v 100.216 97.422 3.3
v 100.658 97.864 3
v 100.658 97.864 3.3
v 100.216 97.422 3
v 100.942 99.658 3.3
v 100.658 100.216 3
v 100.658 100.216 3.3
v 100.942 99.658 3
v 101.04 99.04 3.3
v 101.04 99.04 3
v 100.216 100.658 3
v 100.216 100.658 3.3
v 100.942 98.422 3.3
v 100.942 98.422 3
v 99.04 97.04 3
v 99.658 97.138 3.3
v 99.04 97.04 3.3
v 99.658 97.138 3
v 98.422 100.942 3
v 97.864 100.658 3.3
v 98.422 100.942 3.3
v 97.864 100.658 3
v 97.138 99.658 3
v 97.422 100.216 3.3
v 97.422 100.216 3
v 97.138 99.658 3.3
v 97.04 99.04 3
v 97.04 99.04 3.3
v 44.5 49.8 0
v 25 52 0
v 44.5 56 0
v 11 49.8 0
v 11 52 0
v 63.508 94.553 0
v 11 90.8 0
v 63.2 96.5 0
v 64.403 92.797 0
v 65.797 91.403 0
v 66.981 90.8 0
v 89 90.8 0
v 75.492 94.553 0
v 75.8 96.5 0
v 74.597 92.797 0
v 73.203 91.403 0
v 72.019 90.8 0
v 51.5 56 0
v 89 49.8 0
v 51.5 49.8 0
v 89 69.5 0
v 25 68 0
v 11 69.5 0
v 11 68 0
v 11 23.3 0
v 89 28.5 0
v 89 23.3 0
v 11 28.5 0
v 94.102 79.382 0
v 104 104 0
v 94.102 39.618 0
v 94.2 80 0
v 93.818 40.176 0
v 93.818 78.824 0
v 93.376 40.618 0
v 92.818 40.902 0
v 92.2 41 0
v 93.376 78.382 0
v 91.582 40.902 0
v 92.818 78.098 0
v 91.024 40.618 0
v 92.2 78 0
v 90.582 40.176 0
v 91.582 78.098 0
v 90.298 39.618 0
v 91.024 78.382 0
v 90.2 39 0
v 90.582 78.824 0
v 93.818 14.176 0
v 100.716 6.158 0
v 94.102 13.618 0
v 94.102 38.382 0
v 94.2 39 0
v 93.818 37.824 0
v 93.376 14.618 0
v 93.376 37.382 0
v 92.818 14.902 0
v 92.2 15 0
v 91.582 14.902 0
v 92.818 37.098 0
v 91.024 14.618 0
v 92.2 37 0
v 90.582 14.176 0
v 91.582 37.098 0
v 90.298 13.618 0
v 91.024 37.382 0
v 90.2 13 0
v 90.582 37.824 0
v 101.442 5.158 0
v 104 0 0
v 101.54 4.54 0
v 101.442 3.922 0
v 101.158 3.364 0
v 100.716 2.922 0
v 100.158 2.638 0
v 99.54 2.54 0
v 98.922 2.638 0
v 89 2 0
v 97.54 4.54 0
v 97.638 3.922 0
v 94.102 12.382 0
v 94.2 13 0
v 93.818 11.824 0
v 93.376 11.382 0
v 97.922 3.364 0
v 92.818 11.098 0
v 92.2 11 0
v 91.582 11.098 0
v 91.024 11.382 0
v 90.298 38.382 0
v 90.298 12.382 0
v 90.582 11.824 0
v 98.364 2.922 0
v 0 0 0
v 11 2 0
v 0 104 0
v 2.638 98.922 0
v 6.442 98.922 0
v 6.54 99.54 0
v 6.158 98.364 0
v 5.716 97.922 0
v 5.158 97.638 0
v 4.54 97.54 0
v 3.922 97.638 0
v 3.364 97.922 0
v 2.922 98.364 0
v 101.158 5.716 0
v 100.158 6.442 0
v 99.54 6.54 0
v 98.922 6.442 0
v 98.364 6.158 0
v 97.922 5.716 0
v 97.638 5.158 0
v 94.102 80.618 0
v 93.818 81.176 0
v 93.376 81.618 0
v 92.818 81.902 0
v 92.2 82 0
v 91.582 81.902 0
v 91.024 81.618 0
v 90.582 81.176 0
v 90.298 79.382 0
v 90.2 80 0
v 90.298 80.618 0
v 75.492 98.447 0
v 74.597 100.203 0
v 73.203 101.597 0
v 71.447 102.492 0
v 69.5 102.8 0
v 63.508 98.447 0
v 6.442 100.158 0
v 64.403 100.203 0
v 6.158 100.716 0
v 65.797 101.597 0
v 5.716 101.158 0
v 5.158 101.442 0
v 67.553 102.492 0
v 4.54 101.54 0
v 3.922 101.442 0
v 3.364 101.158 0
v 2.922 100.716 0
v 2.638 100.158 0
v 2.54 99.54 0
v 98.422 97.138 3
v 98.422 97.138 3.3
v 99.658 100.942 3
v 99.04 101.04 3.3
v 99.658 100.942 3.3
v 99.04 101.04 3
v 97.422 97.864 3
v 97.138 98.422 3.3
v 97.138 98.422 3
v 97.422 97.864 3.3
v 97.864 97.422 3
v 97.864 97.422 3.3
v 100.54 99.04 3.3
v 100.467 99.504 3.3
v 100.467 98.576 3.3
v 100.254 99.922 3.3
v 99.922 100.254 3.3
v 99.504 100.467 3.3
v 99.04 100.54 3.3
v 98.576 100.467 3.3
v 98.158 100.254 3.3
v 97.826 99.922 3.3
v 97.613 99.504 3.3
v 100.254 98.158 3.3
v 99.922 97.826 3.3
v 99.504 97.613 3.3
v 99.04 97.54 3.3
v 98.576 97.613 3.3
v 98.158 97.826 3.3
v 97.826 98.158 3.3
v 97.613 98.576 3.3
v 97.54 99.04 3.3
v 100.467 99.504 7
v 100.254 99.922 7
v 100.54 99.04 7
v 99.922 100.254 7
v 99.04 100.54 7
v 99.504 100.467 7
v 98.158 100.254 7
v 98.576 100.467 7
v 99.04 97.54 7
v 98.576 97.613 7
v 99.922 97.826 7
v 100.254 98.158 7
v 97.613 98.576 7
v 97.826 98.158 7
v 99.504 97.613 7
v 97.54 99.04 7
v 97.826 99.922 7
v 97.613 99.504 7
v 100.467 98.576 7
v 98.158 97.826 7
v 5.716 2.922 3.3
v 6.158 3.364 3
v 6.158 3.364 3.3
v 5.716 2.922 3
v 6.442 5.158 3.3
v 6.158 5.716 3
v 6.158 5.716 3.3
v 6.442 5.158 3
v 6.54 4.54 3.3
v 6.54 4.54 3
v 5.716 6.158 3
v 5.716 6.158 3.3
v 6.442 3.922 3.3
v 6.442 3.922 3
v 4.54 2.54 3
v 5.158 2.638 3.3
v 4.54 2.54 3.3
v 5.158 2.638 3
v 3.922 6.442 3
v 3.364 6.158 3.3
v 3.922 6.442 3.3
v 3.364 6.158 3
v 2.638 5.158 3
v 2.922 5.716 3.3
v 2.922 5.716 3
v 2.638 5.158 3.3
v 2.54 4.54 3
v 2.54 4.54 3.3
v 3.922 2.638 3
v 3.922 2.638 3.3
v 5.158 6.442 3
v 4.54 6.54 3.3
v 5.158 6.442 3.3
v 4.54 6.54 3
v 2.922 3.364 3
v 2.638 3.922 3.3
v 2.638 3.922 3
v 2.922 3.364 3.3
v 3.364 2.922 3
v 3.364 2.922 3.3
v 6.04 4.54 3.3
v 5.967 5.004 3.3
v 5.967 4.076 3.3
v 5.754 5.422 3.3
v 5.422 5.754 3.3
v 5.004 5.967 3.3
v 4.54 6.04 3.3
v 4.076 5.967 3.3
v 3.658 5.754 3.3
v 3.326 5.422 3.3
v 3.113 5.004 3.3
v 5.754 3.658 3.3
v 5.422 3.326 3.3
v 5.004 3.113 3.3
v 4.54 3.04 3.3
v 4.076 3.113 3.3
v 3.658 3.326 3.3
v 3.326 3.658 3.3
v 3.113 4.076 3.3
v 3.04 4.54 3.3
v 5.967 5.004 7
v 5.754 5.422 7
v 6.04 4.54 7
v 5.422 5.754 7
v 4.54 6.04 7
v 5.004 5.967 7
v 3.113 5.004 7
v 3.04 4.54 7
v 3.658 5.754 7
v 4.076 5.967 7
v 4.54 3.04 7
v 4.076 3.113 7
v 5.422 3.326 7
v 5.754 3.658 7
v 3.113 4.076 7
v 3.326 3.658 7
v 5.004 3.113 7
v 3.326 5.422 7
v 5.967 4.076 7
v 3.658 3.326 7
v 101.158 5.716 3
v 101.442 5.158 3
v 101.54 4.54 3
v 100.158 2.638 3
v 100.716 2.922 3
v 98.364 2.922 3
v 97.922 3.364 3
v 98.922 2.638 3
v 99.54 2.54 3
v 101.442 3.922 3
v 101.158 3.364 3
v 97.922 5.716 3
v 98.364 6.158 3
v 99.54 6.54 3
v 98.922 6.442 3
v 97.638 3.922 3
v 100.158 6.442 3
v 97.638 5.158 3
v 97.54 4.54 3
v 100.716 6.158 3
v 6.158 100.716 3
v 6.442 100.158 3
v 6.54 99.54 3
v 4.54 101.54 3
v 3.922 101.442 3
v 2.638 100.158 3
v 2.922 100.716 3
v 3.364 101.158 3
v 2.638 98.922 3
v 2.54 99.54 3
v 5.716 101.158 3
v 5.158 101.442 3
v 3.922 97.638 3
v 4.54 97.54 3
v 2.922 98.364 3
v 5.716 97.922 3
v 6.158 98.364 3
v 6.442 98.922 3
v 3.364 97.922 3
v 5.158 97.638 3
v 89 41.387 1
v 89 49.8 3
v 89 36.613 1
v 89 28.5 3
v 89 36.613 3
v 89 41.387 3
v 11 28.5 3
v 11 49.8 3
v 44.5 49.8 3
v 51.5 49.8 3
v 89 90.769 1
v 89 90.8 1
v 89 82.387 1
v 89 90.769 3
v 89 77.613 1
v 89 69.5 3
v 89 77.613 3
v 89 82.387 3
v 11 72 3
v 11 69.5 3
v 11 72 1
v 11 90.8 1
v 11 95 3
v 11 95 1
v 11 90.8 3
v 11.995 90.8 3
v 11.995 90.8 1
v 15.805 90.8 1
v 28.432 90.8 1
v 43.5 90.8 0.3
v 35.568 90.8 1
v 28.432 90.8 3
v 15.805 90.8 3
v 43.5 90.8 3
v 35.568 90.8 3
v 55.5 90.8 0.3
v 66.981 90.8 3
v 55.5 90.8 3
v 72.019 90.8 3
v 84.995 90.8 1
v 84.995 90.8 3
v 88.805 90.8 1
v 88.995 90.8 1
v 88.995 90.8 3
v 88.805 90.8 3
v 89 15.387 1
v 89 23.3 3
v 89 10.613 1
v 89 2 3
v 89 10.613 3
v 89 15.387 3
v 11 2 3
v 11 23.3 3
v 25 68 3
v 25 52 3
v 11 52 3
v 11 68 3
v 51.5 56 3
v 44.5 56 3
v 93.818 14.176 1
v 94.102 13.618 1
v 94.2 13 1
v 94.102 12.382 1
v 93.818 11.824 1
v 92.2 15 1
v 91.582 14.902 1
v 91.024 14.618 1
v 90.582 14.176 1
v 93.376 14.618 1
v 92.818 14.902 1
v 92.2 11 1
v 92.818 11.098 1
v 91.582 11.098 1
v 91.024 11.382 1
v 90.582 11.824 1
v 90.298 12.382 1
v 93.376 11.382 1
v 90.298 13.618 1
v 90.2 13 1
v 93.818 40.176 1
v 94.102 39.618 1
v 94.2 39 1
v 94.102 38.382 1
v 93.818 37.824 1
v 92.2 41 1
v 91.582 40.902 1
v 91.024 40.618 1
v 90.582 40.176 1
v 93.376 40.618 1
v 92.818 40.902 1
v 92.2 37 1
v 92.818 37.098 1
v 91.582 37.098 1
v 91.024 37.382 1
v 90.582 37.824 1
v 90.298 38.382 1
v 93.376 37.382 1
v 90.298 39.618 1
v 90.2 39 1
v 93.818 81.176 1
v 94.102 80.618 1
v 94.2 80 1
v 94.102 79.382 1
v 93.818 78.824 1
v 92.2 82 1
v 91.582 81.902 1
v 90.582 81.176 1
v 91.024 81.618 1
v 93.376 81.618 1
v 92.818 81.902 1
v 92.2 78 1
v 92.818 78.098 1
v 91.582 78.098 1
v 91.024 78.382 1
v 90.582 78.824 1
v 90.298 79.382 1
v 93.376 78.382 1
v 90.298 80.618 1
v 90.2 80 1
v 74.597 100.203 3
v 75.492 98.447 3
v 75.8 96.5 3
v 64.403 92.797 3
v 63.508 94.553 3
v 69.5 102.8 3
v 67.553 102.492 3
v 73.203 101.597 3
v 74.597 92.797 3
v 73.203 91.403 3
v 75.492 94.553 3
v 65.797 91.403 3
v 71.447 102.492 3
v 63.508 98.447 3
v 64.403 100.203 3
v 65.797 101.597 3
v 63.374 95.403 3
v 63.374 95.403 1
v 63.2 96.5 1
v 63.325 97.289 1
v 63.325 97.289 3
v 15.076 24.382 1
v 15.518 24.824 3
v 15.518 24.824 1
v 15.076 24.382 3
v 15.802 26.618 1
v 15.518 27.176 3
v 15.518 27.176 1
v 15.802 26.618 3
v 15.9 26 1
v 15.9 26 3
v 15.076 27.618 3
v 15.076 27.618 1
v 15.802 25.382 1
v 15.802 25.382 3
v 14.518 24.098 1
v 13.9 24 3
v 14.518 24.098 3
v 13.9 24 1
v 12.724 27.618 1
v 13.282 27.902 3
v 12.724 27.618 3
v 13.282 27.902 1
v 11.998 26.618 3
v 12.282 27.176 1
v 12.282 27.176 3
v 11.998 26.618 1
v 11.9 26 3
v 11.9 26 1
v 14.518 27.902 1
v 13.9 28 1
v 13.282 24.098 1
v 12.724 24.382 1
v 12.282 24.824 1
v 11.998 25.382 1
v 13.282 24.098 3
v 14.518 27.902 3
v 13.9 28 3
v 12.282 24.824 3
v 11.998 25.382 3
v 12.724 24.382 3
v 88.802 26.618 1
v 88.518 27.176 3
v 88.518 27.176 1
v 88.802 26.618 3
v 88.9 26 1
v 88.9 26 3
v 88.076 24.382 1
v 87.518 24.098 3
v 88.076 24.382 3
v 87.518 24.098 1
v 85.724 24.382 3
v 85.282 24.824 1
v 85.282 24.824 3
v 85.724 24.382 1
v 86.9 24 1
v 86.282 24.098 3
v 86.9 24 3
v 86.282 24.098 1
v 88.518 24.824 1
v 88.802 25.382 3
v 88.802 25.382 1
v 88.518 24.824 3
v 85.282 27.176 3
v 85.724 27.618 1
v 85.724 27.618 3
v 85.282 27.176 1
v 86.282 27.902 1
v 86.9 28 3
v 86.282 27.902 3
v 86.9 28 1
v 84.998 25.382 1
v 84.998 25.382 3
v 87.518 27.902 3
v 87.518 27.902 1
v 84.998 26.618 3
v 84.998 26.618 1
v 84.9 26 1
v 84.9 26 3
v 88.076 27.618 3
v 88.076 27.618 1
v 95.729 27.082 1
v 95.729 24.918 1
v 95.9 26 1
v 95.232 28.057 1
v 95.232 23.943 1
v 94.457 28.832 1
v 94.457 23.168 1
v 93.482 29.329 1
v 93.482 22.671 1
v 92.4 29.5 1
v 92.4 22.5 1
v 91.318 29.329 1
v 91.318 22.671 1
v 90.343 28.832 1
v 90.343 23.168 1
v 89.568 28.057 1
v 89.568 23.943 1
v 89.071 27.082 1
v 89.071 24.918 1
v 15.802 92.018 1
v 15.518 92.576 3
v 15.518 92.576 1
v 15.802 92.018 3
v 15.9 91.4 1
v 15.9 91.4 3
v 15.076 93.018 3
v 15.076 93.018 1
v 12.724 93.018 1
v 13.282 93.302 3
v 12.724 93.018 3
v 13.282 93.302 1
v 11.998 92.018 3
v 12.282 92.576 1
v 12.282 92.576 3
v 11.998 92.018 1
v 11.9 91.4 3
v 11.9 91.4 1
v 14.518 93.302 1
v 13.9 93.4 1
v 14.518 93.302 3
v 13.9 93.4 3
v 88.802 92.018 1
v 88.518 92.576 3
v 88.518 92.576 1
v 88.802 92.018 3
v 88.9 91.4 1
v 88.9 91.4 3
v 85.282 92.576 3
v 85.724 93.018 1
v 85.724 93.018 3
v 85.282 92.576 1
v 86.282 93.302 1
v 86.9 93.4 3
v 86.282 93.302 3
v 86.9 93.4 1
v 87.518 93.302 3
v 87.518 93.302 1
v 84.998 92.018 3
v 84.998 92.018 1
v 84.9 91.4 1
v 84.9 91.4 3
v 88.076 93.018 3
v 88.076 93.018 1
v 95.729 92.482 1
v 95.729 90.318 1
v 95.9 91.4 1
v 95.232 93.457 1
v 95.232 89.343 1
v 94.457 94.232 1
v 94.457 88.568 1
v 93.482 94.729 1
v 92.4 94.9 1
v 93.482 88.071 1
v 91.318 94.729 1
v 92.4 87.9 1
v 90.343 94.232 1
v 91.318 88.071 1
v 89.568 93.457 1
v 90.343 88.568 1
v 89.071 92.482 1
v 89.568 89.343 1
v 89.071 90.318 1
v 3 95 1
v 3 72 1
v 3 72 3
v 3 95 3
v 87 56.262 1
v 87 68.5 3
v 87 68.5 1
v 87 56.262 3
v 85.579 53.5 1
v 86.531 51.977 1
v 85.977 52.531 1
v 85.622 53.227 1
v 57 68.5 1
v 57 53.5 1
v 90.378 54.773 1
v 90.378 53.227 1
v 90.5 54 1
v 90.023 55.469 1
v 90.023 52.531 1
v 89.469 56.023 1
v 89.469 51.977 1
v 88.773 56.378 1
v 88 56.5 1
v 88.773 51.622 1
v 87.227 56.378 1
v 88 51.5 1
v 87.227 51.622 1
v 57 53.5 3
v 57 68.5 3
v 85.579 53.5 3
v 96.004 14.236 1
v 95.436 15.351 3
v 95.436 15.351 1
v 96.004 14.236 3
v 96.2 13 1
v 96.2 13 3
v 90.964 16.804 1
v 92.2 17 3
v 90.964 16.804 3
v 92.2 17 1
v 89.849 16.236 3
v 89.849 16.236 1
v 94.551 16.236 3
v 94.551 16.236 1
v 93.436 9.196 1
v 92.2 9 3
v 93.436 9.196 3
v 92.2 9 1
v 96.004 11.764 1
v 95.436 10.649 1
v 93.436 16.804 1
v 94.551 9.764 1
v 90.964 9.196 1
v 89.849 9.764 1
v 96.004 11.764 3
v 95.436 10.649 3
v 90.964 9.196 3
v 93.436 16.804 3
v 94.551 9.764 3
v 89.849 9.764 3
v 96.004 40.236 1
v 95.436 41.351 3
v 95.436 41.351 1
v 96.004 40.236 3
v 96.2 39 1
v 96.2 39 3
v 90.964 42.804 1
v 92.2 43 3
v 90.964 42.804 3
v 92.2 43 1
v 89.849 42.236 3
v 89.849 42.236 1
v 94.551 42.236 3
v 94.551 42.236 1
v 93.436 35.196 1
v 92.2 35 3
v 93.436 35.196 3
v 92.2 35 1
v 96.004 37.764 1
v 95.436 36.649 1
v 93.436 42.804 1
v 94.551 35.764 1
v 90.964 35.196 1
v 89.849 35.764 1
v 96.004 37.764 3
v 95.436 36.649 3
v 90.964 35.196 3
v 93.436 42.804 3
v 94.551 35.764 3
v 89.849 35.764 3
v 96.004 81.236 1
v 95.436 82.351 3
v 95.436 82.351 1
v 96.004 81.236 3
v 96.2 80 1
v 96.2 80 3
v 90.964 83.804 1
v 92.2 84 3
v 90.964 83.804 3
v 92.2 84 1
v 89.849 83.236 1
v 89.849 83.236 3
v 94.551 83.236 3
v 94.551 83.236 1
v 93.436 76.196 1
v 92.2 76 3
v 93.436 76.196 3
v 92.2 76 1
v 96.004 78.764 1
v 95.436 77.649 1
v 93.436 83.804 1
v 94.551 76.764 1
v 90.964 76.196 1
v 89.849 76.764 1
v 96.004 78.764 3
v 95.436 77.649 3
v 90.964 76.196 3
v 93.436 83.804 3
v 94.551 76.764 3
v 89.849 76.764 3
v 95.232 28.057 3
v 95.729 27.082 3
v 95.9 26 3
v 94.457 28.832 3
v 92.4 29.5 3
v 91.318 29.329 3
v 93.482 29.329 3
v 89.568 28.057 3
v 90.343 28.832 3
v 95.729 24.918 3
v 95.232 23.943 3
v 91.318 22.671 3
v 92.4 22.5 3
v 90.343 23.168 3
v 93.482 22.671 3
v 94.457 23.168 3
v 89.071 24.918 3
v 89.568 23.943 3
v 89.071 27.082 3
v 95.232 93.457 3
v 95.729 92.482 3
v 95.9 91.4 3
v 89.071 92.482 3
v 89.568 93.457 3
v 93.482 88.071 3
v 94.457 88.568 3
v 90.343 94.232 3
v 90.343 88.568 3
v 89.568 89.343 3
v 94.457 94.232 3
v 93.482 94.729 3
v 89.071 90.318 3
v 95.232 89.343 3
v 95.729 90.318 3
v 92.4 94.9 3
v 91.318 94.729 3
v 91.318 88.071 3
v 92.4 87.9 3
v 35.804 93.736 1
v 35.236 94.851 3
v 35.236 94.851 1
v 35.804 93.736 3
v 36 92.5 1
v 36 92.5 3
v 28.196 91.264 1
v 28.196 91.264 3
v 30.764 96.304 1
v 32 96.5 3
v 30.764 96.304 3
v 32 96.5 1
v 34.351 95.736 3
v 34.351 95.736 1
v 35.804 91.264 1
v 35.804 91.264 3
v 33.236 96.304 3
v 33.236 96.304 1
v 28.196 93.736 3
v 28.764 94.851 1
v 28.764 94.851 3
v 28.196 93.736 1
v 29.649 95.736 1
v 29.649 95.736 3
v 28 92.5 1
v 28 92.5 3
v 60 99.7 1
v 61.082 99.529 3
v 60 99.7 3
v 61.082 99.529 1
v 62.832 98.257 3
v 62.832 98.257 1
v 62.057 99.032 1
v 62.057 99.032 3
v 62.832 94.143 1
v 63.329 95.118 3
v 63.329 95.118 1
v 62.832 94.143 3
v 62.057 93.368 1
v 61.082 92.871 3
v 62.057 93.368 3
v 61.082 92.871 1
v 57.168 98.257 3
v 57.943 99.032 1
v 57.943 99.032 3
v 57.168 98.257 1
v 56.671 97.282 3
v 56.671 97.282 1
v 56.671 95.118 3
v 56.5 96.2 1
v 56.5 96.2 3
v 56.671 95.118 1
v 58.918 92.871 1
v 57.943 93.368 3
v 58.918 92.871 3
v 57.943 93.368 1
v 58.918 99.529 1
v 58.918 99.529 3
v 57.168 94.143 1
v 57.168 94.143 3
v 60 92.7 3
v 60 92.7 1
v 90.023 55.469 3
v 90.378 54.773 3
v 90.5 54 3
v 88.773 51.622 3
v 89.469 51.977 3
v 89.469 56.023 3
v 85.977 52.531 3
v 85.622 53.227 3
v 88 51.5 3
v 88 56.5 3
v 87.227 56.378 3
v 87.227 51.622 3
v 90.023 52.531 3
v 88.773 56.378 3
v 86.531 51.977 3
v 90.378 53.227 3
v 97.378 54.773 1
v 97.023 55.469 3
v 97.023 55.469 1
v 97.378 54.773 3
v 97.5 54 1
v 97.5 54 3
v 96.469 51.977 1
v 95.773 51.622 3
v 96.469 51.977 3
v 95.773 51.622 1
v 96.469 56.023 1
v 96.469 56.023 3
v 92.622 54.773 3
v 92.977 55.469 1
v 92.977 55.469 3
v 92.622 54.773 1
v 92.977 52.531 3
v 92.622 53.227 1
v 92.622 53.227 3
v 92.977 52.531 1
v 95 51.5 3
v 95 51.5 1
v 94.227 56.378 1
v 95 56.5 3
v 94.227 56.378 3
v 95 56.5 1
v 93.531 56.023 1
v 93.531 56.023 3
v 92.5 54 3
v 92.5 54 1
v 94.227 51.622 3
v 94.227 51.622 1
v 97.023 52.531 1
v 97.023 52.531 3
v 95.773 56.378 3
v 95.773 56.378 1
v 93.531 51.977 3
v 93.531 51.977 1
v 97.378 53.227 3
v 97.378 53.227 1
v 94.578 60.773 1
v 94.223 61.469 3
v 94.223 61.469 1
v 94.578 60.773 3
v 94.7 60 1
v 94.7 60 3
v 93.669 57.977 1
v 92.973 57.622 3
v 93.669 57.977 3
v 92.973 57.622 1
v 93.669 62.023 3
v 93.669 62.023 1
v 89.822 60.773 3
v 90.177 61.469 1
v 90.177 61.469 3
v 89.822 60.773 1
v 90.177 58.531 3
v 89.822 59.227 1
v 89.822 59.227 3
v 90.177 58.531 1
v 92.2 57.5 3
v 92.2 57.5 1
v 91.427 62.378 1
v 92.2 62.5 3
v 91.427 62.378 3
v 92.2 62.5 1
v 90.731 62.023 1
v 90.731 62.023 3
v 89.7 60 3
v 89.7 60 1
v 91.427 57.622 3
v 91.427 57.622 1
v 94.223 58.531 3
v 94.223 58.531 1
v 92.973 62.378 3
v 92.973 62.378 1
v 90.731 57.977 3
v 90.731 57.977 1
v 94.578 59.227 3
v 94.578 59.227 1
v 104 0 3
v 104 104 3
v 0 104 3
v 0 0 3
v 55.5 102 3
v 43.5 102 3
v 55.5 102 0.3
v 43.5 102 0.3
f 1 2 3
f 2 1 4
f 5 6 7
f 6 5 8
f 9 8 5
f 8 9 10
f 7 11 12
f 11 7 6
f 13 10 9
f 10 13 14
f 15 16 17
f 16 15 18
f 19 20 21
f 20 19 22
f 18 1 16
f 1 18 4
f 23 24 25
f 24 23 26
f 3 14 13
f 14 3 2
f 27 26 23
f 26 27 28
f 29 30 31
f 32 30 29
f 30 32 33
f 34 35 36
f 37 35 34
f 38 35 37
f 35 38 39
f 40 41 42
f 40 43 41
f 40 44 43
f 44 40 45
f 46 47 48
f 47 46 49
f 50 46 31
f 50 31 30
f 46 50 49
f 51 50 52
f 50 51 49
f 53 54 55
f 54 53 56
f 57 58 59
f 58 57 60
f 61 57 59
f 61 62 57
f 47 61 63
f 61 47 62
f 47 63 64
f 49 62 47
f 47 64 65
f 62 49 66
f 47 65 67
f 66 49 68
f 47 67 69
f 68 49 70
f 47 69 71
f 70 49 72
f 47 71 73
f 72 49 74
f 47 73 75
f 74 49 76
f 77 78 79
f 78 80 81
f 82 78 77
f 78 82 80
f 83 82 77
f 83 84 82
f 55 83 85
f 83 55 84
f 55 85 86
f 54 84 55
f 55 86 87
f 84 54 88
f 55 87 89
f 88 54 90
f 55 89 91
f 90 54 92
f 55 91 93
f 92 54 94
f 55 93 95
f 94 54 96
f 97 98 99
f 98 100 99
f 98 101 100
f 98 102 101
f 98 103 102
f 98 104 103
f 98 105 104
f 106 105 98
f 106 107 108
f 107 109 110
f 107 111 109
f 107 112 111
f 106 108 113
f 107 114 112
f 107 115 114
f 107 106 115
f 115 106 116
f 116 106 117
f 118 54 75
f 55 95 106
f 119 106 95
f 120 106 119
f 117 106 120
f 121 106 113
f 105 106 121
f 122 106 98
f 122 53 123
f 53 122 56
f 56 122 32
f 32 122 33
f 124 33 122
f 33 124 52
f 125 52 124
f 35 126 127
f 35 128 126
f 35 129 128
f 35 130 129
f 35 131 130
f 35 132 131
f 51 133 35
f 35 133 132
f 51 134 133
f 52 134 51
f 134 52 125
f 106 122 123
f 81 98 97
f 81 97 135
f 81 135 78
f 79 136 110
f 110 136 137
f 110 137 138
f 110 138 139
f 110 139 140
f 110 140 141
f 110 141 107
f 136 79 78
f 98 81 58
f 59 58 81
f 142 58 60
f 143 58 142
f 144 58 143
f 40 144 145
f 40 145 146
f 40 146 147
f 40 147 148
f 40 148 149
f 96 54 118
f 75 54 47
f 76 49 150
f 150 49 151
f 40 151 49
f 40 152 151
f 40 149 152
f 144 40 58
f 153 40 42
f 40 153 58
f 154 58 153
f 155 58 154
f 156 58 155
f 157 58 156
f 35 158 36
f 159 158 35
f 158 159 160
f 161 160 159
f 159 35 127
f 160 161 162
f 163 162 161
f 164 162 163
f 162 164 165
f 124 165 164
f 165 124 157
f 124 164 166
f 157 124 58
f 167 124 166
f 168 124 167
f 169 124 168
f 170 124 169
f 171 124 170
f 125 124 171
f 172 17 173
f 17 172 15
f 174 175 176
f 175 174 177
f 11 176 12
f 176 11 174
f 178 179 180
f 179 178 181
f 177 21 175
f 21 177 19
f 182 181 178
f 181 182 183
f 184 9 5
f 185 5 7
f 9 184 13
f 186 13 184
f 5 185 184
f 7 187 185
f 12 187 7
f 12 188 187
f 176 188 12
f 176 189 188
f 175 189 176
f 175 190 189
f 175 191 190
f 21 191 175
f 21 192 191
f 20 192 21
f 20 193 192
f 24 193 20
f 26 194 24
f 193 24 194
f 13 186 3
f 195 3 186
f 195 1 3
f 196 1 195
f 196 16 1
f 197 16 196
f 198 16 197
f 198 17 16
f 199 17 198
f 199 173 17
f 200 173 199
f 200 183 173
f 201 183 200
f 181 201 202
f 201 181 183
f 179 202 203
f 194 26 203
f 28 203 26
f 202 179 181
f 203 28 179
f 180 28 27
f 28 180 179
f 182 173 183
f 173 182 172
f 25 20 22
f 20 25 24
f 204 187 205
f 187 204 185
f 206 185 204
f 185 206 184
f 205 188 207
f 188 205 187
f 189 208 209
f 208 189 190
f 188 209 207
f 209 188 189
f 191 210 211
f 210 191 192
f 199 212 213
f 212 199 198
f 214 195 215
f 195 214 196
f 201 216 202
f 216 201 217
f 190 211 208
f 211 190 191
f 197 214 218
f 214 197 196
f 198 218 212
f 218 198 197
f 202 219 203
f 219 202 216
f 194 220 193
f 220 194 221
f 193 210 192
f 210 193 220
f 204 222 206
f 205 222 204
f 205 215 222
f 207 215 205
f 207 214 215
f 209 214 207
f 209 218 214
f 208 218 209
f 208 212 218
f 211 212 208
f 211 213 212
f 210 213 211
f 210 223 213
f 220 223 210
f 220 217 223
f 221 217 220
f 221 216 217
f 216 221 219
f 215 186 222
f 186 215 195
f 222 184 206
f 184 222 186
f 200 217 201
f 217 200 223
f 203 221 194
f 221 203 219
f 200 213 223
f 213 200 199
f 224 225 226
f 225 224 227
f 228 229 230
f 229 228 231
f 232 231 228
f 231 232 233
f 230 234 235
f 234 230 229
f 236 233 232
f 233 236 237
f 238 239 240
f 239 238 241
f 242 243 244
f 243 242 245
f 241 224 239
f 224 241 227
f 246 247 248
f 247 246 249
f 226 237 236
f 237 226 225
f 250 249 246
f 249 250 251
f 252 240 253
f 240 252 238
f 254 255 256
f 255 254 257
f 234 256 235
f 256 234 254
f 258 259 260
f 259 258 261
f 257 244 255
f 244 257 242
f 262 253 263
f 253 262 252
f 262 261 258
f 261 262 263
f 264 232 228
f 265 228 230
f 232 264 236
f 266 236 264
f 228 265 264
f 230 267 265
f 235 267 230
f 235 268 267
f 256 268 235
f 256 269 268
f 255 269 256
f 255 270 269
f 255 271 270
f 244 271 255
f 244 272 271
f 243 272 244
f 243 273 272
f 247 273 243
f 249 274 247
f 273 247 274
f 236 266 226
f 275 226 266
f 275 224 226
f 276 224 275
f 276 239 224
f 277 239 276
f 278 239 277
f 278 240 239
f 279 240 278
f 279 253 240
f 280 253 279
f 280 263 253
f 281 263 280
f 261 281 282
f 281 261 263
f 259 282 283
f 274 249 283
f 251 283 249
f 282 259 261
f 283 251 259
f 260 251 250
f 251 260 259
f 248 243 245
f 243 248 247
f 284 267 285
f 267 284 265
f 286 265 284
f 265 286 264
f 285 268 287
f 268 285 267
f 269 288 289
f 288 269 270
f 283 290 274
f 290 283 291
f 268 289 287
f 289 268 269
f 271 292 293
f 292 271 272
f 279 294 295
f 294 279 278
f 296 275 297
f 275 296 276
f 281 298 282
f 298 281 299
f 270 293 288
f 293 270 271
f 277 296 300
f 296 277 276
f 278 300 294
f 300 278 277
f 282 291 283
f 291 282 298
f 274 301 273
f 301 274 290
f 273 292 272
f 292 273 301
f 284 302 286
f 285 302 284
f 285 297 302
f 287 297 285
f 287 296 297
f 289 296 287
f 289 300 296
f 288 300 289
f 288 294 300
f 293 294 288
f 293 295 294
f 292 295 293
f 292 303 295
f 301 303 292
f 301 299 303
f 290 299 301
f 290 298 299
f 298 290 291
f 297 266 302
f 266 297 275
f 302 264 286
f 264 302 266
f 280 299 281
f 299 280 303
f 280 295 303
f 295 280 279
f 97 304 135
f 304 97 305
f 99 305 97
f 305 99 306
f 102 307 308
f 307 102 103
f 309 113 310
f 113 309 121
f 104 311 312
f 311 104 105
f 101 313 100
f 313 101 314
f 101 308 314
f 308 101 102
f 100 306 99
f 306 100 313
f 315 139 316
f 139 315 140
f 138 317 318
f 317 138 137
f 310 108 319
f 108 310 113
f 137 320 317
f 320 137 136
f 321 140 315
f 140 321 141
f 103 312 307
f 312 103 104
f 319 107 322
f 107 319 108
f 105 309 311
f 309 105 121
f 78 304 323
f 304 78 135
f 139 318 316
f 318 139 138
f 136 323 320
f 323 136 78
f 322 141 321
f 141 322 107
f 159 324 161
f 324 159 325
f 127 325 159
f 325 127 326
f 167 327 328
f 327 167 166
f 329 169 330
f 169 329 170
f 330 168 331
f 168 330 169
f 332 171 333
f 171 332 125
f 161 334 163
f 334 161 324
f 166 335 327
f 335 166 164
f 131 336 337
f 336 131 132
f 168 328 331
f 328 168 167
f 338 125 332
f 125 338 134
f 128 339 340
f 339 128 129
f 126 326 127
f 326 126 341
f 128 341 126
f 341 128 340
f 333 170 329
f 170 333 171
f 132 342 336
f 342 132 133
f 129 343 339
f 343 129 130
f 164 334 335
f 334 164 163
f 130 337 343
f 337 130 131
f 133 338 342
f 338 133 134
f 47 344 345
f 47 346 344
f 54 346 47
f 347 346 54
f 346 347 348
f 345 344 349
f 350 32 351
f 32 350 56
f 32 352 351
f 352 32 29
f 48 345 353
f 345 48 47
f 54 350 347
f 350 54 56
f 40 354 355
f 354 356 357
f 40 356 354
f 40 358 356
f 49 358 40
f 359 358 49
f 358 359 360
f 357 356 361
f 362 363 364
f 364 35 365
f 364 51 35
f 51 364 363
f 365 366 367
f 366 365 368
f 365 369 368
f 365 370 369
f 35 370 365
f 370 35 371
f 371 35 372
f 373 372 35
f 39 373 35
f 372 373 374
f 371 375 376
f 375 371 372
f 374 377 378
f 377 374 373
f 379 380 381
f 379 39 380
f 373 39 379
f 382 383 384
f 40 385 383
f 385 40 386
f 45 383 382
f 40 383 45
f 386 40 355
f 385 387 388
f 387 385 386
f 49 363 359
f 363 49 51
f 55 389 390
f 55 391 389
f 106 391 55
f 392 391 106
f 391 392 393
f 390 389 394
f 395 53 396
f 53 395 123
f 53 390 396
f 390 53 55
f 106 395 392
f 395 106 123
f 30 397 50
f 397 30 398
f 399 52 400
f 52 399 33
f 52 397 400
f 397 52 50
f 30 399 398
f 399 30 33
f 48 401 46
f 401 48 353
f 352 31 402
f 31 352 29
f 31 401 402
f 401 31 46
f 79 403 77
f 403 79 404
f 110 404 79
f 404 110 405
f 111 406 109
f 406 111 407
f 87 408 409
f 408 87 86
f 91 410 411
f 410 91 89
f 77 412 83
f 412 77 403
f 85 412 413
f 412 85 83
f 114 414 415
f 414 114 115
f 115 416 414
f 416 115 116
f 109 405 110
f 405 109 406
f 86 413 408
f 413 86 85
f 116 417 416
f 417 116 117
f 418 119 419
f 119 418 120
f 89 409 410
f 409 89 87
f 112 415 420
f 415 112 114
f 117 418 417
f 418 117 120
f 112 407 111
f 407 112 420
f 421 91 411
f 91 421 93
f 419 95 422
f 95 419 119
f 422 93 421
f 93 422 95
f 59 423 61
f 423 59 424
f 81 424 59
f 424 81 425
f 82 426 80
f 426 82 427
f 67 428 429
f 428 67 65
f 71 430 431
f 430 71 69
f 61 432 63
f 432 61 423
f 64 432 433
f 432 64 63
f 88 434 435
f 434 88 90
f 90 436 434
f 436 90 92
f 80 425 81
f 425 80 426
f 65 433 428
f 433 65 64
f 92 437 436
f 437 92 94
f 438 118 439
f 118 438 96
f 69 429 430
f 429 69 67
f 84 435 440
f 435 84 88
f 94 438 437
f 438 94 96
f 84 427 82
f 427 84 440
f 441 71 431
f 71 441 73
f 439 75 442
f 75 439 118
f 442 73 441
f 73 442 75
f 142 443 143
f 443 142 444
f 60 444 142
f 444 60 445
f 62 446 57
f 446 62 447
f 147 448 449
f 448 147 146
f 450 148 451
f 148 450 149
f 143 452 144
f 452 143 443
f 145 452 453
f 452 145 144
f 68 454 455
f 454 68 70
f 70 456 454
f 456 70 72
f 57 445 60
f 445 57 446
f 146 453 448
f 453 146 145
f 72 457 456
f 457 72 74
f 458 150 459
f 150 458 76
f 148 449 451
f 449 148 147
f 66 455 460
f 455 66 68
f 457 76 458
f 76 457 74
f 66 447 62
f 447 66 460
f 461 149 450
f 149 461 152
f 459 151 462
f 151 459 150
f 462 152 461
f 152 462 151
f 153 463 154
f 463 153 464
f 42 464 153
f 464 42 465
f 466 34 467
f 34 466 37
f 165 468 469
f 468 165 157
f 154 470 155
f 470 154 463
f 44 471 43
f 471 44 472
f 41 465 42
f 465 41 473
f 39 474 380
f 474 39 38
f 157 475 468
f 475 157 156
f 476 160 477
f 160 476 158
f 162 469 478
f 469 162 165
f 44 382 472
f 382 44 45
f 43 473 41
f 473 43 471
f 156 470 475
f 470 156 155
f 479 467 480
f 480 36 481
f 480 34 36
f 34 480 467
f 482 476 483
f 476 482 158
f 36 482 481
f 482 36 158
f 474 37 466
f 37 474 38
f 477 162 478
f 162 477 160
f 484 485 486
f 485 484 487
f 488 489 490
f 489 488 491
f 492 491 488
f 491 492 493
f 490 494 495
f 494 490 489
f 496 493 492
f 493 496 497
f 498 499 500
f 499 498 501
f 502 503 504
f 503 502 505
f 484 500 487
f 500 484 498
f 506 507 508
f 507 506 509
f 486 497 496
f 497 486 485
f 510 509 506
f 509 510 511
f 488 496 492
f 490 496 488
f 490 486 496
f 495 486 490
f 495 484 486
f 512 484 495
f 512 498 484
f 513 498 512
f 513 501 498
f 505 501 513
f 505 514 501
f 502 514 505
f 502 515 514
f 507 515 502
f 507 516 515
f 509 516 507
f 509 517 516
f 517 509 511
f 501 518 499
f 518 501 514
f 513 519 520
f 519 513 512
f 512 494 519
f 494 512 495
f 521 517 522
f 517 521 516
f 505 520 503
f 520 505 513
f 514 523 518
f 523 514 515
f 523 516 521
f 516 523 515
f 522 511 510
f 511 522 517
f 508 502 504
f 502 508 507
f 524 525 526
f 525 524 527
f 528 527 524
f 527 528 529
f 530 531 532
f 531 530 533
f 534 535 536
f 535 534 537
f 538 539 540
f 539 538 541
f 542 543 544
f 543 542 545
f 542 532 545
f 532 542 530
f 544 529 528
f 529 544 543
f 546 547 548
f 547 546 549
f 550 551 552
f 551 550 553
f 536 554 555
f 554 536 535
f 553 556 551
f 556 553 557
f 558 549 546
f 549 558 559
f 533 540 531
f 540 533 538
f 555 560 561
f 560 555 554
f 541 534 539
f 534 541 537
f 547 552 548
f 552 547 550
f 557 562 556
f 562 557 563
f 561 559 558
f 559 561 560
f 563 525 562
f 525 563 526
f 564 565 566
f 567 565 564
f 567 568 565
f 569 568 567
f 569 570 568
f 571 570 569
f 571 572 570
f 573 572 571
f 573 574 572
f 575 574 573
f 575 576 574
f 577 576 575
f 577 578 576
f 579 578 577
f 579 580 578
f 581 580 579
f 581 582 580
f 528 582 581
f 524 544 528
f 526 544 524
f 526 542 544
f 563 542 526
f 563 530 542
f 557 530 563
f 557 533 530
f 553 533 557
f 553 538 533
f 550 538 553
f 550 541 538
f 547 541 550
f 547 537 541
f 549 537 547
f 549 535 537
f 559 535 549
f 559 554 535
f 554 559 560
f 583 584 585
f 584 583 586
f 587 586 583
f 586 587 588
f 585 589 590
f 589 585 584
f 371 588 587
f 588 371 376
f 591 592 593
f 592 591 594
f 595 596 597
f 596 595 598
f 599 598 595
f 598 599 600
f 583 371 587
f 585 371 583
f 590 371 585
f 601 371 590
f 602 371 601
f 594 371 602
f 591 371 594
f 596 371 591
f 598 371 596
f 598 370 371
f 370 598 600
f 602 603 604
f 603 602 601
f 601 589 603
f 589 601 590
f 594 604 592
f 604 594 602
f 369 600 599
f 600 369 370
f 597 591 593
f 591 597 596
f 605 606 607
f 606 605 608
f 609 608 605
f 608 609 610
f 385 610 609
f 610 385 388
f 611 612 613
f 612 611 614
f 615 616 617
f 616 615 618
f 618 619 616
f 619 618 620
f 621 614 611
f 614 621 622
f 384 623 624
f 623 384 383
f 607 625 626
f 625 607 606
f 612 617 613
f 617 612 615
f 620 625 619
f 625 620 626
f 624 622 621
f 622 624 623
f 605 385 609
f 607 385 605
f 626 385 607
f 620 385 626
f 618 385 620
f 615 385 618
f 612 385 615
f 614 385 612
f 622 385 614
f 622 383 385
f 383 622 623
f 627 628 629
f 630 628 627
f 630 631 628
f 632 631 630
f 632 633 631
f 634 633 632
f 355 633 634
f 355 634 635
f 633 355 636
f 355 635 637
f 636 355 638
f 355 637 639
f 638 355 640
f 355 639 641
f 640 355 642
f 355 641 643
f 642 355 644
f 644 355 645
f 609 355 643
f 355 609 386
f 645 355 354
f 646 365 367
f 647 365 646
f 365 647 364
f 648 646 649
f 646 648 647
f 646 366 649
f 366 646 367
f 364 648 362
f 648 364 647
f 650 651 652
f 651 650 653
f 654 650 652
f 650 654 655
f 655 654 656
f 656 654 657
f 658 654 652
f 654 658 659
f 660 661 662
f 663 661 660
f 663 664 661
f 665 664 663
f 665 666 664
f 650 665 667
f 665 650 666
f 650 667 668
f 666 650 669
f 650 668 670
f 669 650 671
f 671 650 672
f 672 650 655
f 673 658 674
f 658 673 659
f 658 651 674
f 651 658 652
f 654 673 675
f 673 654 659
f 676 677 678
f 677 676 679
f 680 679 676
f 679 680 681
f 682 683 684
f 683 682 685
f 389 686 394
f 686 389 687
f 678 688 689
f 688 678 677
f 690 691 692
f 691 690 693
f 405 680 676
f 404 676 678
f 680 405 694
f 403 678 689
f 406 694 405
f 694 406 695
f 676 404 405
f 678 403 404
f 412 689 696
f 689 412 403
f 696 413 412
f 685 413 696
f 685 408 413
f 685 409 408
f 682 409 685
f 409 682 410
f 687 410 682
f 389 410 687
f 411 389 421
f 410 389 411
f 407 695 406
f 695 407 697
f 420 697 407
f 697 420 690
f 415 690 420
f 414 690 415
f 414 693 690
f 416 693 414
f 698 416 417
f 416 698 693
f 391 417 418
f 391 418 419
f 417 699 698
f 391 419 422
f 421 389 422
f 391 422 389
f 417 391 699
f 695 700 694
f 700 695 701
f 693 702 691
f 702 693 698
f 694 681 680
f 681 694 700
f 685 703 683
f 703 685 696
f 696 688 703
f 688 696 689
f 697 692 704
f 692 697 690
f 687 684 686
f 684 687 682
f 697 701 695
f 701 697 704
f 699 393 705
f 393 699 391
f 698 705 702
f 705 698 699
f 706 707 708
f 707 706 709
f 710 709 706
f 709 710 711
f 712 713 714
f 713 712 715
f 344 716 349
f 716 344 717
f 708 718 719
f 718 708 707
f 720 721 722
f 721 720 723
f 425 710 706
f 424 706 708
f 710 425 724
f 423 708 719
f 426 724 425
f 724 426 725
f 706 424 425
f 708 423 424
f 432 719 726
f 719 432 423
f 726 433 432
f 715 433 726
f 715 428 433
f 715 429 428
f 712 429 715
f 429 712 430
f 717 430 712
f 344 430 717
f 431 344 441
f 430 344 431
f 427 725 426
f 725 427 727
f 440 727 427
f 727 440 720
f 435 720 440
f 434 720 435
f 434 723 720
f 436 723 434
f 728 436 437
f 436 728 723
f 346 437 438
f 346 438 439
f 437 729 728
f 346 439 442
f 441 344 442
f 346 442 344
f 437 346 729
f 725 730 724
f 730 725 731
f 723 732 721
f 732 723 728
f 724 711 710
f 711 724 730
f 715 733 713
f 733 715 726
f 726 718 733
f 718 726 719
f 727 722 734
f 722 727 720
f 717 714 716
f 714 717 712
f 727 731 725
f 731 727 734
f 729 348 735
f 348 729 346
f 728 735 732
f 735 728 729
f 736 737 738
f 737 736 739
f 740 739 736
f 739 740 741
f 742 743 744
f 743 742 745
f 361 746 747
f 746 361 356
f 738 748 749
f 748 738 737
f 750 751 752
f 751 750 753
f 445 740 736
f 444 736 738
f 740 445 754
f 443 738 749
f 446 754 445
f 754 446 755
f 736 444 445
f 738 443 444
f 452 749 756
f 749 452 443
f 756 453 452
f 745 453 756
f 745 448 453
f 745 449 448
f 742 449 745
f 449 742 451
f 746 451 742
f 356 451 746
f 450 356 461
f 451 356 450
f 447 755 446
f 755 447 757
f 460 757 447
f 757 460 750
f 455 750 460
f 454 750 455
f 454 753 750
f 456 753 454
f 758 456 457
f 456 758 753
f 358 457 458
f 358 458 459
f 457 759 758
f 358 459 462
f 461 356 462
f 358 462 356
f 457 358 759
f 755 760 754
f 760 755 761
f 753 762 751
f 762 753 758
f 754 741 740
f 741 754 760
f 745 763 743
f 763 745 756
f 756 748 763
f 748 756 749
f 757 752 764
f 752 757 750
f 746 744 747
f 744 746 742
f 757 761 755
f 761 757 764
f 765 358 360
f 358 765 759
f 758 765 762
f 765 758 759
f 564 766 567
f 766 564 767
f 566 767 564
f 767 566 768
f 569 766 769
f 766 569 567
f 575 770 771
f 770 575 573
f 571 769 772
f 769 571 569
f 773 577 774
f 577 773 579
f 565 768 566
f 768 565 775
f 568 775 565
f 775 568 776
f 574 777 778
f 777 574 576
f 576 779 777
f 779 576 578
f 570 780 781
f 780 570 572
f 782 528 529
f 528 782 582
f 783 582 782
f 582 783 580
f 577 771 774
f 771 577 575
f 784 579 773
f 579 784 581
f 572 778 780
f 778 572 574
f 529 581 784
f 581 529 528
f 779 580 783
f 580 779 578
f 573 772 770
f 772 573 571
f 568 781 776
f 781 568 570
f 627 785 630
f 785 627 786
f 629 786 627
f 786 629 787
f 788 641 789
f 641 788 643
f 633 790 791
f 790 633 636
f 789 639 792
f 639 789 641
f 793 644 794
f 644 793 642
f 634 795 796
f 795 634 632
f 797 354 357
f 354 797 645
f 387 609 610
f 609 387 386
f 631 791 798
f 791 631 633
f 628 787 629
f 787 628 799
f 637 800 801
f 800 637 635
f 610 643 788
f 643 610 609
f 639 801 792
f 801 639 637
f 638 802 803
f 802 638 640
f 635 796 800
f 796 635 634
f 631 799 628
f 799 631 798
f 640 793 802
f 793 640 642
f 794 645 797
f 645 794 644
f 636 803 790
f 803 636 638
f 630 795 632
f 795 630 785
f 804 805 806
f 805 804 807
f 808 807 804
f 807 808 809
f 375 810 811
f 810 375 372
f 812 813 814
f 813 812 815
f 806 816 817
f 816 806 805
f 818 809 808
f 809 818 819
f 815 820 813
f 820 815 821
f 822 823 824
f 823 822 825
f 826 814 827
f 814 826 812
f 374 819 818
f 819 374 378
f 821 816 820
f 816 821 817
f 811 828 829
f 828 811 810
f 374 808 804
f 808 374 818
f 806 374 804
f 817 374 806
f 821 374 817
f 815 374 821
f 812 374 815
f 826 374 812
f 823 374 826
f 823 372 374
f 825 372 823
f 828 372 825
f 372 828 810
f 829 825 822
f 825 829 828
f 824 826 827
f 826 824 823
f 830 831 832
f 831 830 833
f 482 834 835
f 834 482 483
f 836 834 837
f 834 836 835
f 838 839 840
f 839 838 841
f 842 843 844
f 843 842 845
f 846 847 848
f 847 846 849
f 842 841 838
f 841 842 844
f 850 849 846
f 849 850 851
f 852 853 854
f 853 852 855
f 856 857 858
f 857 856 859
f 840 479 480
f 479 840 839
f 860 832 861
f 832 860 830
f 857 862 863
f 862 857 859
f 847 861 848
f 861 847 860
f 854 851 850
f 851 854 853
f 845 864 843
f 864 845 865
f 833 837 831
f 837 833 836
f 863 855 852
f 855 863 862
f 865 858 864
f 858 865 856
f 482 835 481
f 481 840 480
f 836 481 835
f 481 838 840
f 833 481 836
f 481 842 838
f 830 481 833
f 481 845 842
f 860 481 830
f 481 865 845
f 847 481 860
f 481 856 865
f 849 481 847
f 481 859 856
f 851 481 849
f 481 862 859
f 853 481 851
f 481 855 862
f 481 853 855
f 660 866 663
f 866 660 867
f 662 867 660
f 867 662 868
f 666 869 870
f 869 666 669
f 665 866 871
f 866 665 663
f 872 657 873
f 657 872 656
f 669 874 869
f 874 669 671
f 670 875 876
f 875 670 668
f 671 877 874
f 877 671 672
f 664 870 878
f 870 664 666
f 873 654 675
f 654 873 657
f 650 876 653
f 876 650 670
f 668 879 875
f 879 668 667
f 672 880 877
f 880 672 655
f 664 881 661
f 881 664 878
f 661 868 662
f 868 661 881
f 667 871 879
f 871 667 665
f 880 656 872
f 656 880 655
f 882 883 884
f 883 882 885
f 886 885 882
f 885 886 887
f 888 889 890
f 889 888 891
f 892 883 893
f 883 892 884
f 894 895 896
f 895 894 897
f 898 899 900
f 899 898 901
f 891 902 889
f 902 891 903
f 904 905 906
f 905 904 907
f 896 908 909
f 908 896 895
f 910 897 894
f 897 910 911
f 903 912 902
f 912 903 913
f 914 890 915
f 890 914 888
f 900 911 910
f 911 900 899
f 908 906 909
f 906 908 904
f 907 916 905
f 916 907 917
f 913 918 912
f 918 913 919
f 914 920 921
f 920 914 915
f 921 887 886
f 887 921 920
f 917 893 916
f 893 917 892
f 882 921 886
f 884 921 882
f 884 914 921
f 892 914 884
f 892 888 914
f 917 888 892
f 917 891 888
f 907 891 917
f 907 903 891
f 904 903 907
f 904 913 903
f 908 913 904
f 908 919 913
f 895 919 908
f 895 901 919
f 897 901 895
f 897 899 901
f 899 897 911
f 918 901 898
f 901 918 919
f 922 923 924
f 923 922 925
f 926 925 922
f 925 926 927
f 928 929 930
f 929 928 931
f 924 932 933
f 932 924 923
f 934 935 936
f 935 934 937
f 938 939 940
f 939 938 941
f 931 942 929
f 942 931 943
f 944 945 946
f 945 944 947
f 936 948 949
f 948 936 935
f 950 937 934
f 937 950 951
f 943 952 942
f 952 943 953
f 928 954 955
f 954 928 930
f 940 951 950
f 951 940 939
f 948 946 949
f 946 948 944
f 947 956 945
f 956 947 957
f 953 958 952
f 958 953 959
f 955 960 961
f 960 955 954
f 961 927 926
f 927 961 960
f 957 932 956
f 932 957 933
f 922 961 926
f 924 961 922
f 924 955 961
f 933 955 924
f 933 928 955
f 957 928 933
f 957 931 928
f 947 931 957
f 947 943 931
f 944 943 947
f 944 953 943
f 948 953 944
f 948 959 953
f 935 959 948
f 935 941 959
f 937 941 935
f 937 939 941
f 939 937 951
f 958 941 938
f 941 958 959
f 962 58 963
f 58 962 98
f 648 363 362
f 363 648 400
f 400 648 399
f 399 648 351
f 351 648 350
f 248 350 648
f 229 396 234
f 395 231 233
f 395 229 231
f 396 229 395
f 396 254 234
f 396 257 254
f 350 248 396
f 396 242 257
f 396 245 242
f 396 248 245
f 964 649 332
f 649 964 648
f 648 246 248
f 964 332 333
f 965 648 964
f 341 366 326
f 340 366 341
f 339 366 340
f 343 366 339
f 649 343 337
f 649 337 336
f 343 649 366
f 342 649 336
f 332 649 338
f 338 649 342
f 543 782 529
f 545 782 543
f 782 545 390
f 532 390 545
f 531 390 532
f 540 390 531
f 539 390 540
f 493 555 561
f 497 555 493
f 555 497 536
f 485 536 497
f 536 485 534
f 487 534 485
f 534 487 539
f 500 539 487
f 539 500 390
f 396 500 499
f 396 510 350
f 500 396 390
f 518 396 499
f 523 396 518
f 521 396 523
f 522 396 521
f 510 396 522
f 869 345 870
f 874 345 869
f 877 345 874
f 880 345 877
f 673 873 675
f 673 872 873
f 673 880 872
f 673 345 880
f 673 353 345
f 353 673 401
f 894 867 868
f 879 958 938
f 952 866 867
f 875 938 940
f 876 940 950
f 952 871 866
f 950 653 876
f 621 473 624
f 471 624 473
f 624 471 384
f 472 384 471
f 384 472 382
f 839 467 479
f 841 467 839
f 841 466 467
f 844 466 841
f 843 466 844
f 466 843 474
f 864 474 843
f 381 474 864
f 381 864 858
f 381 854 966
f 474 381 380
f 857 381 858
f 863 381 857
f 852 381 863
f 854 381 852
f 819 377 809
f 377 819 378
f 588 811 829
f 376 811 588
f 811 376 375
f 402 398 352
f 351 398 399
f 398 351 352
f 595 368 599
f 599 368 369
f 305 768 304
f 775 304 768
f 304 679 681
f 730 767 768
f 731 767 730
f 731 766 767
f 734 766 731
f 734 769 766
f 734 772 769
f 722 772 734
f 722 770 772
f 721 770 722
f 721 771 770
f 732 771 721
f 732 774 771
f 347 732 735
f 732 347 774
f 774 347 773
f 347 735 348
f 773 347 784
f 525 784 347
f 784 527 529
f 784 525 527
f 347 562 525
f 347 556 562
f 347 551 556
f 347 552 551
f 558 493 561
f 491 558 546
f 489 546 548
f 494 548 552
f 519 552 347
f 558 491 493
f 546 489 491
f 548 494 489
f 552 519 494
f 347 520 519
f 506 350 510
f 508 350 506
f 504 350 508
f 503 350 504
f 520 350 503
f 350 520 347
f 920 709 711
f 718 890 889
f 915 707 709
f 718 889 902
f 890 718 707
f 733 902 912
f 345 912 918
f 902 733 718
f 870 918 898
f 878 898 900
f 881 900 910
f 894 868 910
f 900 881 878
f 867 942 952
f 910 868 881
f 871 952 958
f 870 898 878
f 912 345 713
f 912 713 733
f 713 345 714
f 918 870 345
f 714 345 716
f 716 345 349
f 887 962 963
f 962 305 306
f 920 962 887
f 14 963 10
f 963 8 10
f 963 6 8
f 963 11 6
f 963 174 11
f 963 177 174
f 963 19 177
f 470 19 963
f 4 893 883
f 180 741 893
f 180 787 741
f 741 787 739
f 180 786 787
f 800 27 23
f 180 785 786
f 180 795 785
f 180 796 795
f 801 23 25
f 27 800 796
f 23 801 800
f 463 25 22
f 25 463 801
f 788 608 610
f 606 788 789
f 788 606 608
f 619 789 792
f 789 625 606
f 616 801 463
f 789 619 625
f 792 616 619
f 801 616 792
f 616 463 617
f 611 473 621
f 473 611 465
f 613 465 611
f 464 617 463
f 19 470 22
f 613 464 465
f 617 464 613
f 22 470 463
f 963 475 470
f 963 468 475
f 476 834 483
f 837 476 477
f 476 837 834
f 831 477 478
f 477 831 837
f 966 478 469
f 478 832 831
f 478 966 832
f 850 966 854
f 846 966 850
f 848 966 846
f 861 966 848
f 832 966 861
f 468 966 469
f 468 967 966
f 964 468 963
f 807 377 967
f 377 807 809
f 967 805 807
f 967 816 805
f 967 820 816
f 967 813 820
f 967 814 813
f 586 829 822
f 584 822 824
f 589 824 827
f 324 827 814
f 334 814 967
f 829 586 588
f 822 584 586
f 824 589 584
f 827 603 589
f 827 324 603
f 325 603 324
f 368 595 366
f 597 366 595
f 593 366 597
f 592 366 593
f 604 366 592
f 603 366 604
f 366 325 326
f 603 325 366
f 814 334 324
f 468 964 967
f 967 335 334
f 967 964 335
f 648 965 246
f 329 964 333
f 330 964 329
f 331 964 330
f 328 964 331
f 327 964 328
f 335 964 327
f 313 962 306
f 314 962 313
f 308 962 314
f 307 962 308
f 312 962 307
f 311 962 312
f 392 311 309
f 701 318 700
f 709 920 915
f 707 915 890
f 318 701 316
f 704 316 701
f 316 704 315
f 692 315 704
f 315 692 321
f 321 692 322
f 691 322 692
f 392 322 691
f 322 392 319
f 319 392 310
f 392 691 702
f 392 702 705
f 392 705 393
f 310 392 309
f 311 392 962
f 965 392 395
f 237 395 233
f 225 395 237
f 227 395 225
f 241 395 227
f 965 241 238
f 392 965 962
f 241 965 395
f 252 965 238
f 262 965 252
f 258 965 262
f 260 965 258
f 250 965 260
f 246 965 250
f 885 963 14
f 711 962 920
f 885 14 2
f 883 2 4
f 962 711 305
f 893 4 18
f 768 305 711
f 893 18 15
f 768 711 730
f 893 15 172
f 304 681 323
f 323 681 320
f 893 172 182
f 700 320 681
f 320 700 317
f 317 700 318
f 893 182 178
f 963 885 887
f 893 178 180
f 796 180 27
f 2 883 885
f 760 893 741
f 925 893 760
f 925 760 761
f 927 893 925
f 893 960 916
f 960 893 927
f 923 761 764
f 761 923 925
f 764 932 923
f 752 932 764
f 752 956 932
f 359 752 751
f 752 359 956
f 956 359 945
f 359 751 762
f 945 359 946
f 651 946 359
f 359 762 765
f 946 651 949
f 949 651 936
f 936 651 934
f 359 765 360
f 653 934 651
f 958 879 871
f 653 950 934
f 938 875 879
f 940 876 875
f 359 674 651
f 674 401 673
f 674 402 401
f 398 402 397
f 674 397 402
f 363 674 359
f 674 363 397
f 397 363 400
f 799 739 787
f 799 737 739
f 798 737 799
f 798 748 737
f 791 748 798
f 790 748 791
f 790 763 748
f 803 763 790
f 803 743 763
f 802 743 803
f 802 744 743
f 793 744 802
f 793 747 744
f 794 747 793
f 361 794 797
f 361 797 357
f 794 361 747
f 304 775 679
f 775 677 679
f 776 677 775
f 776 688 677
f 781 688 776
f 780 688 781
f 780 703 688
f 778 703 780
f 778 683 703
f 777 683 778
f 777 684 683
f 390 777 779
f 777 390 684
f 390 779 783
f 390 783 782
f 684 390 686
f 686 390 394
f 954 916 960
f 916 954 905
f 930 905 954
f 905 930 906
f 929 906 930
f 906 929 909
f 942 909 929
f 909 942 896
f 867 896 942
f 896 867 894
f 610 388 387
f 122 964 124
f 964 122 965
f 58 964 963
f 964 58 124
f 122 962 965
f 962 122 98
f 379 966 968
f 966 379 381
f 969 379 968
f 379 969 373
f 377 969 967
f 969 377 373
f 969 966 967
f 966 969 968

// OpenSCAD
$fn=20;
pcbx=100;
pcby=100;
bh=2;

translate([bh,bh,0])
translate([2.54,2.54,0]) {
cylinder(h=3.3,r=2); 
 cylinder(h=7,r=1.5);

translate([94.5,94.5,0]){ 
cylinder(h=3.3,r=2); 
 cylinder(h=7,r=1.5);
}
}

difference(){
cube([pcbx+bh+bh,pcby+bh+bh,3]);
translate([bh,bh,0]) {

translate([2.54,2.54,0]) {
translate([95,0,0]) cylinder(h=7,r=2);
translate([0,95,0]) cylinder(h=7,r=2);
}

translate([9,26.5,0]) cube([78,21.3,4]); //B3
translate([9,67.5,0]) cube([78,21.3,4]); //B4
translate([9,0,0]) cube([78,21.3,4]);  //b5
translate([9,50,0]) cube([14,16,4]);   //label 
translate([46,50.5,0]) cube([7,7,4*2],true);  // reset switch  y=50 

translate([90.2,11,0]) cylinder(h=4,r=2);//led3 
translate([90.2,37,0]) cylinder(h=4,r=2);//led4 
translate([90.2,78,0]) cylinder(h=4,r=2);//led5

translate([66+1.5,94.5,0]) cylinder(h=4,r=6.3);//bat 
}
translate([bh,bh,0.3]){
translate([41.5,88,0]) cube([12,12,4]);//U9
}
translate([bh,bh,1]){
translate([1,70,0]) cube([8,23,4]); //s2 s3
translate([55,51.5,0]) cube([32-2,15,4]);  //usbcom 
translate([90.2,11,0]) cylinder(h=4,r=4);//led3
translate([90.2,37,0]) cylinder(h=4,r=4);//led4 
translate([90.2,78,0]) cylinder(h=4,r=4);//led5

translate([11.9,100-76,0])  {
cylinder(h=4,r=2);//B2
translate([73,0,0]) cylinder(h=4,r=2);//B2
}

translate([11.9,100-10.6,0])  {
cylinder(h=4,r=2);//B1
translate([73,0,0]) cylinder(h=4,r=2);//B1
}

translate([90.4,100-76,0]) cylinder(h=4,r=3.5);//led2
translate([90.4,100-10.6,0]) cylinder(h=4,r=3.5);//led1

translate([30,100-9.5,0]) cylinder(h=4,r=4);//r24,r3

translate([58,100-5.8,0]) cylinder(h=4,r=3.5);//d1

translate([86,100-48,0]) cylinder(h=4,r=2.5);//power
translate([93,100-48,0]) cylinder(h=4,r=2.5);//power
translate([90.2,100-42,0]) cylinder(h=4,r=2.5);//power
}
}
